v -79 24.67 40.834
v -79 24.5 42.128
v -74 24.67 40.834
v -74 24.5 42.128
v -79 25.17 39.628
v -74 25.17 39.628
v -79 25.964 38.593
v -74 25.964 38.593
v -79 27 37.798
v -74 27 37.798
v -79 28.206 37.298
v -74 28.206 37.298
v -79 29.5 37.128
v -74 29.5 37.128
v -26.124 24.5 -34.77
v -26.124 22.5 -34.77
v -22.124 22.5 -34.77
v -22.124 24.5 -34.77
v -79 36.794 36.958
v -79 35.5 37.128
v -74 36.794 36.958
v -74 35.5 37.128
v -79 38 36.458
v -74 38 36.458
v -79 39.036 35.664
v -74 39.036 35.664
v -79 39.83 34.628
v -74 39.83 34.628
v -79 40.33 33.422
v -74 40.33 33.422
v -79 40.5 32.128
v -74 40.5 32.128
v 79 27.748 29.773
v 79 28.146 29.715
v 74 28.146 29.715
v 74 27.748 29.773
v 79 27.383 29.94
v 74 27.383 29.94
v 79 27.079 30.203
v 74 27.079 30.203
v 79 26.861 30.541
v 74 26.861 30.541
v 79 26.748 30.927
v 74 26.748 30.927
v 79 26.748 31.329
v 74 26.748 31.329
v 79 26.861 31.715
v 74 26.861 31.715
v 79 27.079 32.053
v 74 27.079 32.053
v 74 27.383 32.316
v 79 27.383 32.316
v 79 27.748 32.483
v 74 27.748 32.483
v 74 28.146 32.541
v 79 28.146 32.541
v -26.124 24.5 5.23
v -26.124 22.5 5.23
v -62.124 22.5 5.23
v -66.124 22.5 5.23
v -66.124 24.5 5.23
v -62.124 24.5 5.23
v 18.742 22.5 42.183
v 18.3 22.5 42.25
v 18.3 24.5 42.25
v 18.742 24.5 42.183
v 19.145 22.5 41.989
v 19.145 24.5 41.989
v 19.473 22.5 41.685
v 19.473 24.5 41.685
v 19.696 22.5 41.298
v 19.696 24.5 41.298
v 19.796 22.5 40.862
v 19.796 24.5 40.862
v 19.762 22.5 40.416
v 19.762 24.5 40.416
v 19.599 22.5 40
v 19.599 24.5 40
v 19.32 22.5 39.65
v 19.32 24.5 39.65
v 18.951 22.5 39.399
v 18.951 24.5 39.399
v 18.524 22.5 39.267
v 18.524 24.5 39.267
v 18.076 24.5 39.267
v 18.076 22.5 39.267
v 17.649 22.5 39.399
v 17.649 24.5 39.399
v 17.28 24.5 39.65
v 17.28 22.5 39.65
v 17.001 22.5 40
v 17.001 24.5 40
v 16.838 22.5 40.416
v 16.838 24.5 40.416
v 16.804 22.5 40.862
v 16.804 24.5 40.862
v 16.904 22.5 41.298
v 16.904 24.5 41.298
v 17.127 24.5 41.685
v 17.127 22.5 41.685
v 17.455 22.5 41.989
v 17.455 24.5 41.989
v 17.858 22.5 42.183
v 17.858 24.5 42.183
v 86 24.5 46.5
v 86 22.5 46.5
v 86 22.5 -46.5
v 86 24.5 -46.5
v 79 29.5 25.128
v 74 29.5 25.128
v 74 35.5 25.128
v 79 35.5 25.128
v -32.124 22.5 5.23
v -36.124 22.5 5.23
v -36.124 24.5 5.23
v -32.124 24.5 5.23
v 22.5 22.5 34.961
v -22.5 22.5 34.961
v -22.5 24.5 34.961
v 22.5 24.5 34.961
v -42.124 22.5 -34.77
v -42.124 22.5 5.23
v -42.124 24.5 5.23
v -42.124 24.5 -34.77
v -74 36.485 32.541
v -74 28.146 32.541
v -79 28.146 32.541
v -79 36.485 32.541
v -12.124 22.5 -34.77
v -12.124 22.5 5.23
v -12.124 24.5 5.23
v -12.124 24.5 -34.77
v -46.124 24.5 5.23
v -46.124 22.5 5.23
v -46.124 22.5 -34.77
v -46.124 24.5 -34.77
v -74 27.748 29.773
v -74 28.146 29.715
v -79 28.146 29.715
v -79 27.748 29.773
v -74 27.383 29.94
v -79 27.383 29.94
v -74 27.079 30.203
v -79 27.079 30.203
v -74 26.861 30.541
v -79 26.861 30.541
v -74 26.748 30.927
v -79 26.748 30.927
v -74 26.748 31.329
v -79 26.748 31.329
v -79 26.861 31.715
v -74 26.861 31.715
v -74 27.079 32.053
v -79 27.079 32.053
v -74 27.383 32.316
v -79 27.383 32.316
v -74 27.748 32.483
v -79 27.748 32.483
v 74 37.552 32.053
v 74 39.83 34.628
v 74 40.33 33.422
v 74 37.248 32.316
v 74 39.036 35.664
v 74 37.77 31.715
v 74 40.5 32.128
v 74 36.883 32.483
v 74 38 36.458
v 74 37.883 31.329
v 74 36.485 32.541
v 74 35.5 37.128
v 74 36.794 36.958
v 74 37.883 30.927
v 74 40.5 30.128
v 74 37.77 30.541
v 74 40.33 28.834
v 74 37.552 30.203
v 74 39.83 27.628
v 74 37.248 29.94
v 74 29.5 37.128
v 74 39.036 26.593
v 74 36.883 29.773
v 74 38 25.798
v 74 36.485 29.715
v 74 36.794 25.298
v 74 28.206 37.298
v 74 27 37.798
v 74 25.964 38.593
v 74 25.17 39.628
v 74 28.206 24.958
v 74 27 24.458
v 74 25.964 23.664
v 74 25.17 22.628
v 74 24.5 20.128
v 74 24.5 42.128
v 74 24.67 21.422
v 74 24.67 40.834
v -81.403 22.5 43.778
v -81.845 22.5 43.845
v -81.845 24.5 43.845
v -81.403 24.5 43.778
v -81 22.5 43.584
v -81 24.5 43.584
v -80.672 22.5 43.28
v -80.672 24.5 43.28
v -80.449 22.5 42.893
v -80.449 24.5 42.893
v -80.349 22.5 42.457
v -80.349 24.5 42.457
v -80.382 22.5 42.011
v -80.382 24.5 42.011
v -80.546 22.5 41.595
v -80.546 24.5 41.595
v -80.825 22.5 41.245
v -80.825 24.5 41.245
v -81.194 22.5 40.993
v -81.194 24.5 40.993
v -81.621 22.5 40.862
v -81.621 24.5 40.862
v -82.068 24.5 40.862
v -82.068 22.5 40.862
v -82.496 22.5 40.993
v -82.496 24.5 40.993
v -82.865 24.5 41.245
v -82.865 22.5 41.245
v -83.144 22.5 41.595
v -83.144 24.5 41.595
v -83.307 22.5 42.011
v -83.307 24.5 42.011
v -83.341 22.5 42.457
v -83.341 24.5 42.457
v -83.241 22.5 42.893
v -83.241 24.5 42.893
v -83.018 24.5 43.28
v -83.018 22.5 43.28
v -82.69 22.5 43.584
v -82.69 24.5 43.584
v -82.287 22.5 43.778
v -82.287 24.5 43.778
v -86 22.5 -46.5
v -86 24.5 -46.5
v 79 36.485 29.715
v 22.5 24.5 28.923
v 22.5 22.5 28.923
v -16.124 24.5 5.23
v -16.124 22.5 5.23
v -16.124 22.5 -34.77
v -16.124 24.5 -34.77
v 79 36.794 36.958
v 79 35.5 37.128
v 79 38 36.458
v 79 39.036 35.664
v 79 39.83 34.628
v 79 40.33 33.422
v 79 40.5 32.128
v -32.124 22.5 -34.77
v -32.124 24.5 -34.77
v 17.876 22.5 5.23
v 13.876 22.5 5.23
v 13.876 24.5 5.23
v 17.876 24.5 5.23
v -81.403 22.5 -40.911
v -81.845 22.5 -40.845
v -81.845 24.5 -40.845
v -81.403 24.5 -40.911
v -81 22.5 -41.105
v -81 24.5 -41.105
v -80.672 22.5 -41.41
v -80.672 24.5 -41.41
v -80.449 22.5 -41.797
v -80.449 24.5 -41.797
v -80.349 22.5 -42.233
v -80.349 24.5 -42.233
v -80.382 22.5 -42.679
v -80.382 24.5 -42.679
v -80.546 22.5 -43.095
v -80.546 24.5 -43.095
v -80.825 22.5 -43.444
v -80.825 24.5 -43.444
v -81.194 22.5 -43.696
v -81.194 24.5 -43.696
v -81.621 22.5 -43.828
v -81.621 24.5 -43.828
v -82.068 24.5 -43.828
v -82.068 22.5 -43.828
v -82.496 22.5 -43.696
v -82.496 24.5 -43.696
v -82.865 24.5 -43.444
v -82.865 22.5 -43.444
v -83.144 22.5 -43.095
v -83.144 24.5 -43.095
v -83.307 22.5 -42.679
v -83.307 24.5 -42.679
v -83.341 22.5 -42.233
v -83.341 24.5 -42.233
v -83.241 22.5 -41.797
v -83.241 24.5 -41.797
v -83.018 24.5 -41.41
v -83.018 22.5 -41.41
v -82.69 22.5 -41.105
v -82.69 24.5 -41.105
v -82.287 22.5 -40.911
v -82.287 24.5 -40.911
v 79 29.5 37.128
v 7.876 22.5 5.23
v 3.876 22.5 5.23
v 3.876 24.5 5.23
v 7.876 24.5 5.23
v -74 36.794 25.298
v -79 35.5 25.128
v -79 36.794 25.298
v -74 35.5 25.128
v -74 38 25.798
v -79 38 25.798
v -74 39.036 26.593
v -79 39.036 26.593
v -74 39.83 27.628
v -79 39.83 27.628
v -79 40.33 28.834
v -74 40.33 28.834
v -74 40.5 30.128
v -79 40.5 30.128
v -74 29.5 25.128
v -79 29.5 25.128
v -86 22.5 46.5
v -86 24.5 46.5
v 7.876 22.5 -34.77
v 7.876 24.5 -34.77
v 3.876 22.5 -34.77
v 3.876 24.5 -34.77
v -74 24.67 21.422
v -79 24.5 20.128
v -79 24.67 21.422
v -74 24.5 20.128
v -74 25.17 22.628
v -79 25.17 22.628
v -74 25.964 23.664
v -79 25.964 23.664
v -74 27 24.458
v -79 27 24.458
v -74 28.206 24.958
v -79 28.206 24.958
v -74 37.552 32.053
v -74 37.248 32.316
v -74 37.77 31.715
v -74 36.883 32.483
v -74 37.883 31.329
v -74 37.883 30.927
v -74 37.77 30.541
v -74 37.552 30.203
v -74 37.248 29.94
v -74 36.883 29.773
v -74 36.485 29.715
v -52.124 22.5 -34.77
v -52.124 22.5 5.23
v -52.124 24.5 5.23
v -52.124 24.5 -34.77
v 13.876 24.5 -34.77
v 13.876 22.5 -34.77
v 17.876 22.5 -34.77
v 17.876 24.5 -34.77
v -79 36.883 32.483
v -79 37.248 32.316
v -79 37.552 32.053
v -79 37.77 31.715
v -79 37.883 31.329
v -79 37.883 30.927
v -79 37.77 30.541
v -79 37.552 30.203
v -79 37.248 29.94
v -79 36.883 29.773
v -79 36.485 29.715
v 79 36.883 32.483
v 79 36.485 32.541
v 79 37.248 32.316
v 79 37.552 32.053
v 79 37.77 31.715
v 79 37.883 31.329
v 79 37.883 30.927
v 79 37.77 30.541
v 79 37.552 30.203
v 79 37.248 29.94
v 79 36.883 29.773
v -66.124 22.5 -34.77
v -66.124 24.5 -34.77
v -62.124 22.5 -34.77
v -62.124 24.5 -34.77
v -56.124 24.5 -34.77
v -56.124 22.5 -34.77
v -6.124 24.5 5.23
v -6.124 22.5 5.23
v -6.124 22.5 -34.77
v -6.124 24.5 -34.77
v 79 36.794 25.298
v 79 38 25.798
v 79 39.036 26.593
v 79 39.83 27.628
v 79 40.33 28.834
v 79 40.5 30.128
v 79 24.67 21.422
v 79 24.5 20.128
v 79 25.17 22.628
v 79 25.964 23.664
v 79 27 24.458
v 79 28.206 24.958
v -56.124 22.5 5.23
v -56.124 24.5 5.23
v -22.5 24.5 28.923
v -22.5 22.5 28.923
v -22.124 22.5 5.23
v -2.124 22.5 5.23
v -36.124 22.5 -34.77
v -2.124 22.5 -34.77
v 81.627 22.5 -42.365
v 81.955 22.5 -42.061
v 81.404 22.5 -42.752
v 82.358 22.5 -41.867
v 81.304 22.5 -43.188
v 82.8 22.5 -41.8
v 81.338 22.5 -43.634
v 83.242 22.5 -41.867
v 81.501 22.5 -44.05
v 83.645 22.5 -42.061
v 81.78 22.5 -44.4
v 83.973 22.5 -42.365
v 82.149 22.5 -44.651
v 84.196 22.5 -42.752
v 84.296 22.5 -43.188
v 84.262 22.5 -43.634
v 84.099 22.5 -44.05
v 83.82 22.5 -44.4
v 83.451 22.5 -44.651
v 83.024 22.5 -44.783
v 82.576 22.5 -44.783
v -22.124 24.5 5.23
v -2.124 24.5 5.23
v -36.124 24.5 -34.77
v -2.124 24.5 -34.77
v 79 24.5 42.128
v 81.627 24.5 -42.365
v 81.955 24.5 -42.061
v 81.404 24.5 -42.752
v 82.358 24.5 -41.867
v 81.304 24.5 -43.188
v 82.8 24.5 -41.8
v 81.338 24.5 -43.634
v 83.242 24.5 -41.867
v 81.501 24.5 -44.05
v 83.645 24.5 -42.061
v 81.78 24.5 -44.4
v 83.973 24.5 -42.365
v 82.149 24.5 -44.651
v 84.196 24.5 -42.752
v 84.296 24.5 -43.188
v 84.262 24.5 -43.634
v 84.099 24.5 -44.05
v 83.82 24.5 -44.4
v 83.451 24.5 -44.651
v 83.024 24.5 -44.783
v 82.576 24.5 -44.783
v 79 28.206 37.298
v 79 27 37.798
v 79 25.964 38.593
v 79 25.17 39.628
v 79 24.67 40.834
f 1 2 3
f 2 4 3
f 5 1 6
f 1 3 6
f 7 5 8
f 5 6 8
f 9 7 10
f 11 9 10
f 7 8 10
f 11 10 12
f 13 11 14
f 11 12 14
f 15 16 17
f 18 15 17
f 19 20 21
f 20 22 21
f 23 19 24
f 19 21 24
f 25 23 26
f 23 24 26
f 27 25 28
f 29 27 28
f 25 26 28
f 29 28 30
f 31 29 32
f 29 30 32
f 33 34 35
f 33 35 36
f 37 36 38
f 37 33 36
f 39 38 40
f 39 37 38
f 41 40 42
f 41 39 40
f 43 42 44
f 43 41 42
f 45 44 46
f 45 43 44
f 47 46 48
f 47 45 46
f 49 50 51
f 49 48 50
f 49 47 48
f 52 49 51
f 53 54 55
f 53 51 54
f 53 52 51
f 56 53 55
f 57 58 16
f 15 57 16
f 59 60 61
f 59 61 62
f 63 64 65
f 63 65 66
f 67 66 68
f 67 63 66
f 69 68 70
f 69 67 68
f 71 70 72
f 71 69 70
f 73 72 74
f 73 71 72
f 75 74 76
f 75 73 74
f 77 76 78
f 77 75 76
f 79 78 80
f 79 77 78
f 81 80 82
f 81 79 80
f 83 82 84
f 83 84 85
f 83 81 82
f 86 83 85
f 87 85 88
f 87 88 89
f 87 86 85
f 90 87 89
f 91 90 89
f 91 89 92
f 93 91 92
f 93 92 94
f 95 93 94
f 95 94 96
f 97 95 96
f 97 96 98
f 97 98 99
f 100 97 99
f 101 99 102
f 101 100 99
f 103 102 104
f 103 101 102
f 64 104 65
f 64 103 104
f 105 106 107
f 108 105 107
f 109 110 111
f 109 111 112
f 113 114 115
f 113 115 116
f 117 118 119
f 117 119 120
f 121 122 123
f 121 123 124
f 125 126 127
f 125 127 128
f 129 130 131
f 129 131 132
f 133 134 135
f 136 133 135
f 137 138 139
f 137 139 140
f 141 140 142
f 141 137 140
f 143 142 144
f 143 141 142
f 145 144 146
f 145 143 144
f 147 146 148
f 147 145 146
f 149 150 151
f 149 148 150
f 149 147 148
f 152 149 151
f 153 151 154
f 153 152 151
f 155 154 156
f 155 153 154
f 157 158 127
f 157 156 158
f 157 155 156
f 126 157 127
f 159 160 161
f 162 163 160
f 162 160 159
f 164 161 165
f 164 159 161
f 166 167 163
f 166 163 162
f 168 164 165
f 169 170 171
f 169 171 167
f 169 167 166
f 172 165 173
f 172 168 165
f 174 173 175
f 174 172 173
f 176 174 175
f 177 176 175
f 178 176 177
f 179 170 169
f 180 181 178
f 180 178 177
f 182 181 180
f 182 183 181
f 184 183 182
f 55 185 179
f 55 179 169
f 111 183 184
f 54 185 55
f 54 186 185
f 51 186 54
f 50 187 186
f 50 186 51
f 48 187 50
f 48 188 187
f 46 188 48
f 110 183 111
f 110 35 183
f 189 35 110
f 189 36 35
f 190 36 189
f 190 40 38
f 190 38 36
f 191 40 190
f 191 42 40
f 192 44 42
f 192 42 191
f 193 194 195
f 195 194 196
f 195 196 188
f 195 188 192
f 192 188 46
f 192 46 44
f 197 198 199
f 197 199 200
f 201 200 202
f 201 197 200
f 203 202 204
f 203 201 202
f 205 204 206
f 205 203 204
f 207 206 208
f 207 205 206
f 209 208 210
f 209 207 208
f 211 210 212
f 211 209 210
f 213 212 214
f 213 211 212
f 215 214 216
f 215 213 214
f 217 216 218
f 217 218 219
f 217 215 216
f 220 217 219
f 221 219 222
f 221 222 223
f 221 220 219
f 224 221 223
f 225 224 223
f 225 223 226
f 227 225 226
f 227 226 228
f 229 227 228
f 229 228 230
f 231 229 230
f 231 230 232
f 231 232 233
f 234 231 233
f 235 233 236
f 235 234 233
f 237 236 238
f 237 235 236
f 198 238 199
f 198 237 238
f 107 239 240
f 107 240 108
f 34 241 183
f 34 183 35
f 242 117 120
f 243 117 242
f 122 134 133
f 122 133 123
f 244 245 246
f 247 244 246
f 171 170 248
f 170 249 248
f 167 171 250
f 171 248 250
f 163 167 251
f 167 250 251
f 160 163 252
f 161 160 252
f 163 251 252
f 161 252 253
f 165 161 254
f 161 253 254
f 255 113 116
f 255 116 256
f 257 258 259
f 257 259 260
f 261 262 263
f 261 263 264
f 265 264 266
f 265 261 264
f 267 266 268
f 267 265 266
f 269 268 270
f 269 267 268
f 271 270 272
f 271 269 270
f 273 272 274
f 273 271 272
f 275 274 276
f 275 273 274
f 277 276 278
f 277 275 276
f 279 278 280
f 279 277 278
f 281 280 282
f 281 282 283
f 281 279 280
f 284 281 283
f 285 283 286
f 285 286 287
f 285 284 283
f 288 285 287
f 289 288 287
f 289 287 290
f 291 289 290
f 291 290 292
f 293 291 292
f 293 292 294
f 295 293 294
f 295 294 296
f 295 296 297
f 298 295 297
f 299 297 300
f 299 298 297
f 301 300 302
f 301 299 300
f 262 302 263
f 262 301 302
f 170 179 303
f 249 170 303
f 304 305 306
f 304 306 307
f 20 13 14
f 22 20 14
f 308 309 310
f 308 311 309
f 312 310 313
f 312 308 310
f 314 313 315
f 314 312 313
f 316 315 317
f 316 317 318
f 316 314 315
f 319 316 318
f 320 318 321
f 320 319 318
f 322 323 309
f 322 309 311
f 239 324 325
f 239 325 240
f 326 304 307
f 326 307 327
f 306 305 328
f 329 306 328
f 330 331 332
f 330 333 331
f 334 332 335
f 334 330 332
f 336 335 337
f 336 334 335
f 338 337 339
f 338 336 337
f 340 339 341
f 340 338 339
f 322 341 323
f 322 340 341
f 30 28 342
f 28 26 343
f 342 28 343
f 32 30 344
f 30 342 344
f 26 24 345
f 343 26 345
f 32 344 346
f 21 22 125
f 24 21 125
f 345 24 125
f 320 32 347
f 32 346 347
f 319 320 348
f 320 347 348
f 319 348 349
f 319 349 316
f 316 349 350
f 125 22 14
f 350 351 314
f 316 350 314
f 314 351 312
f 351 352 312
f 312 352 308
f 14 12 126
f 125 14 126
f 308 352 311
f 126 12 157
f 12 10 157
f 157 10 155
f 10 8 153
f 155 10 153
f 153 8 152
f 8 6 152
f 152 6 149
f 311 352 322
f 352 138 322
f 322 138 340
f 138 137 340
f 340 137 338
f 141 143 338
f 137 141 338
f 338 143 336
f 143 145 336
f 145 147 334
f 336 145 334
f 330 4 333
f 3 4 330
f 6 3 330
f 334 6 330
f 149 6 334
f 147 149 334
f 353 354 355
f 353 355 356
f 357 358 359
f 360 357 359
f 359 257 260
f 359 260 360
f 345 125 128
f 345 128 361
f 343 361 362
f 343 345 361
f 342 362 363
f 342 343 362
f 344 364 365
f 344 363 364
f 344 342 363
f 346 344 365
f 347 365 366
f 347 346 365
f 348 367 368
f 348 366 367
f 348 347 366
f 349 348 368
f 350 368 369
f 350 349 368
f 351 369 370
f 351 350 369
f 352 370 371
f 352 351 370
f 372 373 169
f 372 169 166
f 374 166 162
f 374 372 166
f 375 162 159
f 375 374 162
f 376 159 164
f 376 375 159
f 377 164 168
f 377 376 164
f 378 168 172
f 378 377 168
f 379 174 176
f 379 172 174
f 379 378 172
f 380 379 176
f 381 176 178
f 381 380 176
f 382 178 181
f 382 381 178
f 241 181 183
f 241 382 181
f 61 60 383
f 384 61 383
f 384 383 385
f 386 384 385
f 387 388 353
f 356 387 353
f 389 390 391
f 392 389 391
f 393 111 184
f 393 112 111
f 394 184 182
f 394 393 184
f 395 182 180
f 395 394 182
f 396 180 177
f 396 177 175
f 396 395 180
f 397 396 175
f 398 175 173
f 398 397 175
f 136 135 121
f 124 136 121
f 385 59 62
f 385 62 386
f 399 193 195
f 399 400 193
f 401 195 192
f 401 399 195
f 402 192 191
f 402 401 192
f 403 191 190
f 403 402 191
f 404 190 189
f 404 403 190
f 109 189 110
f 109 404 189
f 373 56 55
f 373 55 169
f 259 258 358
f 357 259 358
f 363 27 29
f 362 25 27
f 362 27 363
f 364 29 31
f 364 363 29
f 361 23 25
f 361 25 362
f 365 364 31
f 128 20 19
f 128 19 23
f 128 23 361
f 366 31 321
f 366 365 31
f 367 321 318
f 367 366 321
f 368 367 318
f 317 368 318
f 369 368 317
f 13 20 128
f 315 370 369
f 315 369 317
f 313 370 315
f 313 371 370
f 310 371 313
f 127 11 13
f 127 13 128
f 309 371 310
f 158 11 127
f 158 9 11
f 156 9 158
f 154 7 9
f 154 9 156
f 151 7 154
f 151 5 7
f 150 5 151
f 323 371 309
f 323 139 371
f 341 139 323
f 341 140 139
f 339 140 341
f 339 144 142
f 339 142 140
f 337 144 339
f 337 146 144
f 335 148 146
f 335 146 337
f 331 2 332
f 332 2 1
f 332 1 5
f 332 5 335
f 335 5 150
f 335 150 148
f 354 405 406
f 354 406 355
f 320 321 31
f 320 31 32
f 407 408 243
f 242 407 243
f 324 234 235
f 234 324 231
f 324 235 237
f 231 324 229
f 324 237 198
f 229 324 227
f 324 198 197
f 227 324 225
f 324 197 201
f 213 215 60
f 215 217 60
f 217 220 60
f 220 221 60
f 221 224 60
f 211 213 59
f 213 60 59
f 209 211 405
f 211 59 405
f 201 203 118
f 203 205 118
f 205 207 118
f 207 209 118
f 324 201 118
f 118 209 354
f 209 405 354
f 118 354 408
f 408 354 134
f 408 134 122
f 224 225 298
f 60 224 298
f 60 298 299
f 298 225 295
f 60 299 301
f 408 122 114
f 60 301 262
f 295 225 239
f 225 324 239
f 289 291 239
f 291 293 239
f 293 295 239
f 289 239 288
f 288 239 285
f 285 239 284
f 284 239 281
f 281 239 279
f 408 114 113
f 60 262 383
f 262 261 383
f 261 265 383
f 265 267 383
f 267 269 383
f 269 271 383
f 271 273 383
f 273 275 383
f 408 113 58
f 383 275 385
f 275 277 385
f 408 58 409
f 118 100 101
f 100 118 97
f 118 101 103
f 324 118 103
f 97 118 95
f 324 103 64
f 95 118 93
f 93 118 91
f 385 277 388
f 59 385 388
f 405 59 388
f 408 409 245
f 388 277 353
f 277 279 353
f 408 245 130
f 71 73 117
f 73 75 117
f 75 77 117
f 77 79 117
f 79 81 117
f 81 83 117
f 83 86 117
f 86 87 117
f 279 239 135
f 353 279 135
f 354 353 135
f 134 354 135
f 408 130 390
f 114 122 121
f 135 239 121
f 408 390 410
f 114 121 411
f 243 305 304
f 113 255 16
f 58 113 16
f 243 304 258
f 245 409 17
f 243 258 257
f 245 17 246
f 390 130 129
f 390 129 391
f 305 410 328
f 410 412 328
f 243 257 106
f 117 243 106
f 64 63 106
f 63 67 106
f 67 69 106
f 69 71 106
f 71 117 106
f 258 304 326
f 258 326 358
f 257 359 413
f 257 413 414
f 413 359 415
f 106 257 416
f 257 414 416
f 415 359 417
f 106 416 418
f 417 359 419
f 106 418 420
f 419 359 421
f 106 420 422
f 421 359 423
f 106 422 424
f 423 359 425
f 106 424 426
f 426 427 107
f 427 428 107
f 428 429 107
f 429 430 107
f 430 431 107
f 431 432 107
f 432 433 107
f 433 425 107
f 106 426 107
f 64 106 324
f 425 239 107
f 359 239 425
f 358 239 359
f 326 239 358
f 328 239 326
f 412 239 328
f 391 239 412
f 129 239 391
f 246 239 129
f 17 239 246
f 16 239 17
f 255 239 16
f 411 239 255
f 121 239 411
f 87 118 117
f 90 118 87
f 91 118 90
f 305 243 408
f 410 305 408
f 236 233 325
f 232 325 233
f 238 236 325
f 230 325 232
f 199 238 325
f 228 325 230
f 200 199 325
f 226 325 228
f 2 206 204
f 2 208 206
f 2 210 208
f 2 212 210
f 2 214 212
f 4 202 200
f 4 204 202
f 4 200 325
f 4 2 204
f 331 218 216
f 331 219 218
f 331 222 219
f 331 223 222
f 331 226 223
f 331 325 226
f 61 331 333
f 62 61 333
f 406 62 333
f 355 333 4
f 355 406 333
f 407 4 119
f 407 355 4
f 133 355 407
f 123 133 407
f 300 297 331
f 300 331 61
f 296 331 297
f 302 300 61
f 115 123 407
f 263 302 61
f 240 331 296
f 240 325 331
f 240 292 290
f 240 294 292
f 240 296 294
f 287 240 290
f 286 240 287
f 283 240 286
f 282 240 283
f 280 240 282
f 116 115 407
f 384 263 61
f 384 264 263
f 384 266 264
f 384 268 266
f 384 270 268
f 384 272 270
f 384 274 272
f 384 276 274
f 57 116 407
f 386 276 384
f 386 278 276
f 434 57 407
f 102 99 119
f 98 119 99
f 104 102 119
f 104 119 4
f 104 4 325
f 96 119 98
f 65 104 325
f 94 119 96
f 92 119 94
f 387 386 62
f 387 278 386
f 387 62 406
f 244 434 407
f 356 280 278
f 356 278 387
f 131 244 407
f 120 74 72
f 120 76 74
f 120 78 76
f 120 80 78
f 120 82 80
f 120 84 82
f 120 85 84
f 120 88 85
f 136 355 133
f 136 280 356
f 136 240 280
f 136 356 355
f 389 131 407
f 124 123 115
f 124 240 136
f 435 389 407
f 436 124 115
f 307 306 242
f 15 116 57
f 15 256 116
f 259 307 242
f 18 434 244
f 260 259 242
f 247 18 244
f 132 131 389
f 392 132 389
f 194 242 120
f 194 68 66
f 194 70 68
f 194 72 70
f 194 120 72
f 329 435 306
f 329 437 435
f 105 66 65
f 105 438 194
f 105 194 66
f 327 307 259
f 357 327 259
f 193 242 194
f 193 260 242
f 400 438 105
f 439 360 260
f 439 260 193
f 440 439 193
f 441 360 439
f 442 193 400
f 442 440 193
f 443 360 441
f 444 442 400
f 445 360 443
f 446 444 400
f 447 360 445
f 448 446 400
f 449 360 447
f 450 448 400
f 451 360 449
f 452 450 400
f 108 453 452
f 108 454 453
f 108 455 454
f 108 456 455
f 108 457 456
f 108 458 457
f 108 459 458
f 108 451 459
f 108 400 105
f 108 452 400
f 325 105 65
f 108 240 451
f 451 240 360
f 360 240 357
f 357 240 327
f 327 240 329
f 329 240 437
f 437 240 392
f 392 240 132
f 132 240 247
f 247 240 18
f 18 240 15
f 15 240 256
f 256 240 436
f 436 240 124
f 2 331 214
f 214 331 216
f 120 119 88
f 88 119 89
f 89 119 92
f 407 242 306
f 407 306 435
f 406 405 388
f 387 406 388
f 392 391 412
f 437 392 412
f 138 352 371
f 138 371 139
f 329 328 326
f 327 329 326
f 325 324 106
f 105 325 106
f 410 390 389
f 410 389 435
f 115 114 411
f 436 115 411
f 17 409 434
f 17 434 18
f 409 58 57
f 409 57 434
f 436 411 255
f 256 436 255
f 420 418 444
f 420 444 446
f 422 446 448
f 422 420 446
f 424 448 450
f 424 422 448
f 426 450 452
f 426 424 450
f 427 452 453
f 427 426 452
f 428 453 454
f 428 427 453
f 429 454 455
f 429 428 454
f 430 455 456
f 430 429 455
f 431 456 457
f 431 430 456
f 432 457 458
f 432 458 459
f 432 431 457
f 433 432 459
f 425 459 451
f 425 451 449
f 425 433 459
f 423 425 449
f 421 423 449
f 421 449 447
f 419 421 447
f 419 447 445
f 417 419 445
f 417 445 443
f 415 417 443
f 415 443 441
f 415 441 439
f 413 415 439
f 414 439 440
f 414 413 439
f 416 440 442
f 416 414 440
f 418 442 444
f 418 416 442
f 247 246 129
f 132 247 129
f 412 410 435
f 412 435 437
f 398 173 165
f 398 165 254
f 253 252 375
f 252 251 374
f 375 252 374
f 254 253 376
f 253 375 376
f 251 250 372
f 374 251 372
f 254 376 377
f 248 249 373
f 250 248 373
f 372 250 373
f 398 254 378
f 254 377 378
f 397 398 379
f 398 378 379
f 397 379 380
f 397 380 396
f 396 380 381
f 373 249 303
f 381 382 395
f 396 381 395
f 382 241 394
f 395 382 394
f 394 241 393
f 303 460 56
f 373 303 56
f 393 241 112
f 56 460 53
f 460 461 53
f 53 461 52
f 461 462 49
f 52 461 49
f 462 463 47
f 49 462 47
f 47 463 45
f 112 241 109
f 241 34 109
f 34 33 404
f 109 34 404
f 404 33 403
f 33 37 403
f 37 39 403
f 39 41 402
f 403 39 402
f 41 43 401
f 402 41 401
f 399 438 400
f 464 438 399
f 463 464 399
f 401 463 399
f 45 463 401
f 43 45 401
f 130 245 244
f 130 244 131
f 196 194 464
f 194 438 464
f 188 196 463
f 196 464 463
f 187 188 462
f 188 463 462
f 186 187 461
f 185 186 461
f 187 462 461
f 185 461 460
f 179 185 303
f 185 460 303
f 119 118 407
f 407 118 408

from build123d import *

# Parameters (mm, degrees)
SKETCH1_W            = 172
SKETCH1_H            = 93
BOSS_EXTRUDE1_DEPTH  = 1
SKETCH2_W            = 172
SKETCH2_H            = 93
SKETCH2_W_2          = 169
SKETCH2_H_2          = 90
BOSS_EXTRUDE2_DEPTH  = 21.5
SKETCH3_W            = 14.5
SKETCH3_H            = 20
SKETCH3_W_2          = 16.2
SKETCH3_W_3          = 76
SKETCH3_H_2          = 7
CUT_EXTRUDE1_DEPTH   = 21.5
BOSS_EXTRUDE3_DEPTH  = 10
FILLET1_R            = 4
SKETCH5_R            = 1.5
BOSS_EXTRUDE4_DEPTH  = 2.5
BOSS_EXTRUDE5_DEPTH  = 10
SKETCH7_W            = 1.5
SKETCH7_H            = 3.5
BOSS_EXTRUDE6_DEPTH  = 10
FILLET2_R            = 4
SKETCH8_R            = 4
SKETCH8_R_2          = 1.5
BOSS_EXTRUDE7_DEPTH  = 14
SKETCH10_W           = 16
SKETCH10_H           = 4
CUT_EXTRUDE2_DEPTH   = 14
CUT_EXTRUDE3_DEPTH   = 1.6
FILLET3_R            = 4
SKETCH12_W           = 10
SKETCH12_H           = 6
SKETCH12_W_2         = 8
SKETCH12_H_2         = 8
CUT_EXTRUDE4_DEPTH   = 25.1
SKETCH13_W           = 6.4
SKETCH13_H           = 6.4
SKETCH13_W_2         = 6
SKETCH13_H_2         = 6
BOSS_EXTRUDE8_DEPTH  = 21.5
FILLET4_R            = 3
SKETCH14_R           = 1.5
CUT_EXTRUDE5_DEPTH   = 20
SKETCH15_W           = 172
SKETCH15_H           = 93
SKETCH15_R           = 1.5
SKETCH15_W_2         = 4
SKETCH15_H_2         = 40
SKETCH15_W_3         = 45
SKETCH15_H_3         = 6.0381788
BOSS_EXTRUDE9_DEPTH  = 2
SKETCH16_W           = 56
SKETCH16_H           = 7.274551358
CUT_EXTRUDE6_DEPTH   = 2
SKETCH17_W           = 5
SKETCH17_H           = 12
BOSS_EXTRUDE10_DEPTH = 16
FILLET6_R            = 5
CUT_EXTRUDE7_DEPTH   = 166


# Read off the part's stored shape, not the designer's step: Intersect2
# Some blends are built 0.0001 mm under size
with BuildPart() as part:
    # Sketch1 → Boss-Extrude1 (new body)
    with BuildSketch(Plane(origin=(0, 0, 0), x_dir=(1, 0, 0), z_dir=(0, 1, 0))):
        Rectangle(SKETCH1_W, SKETCH1_H)
    extrude(amount=BOSS_EXTRUDE1_DEPTH)

    # Sketch2 → Boss-Extrude2 (add)
    with BuildSketch(Plane(origin=(0, 1, 0), x_dir=(1, 0, 0), z_dir=(0, 1, 0))):
        Rectangle(SKETCH2_W, SKETCH2_H)
        Rectangle(SKETCH2_W_2, SKETCH2_H_2, mode=Mode.SUBTRACT)
    extrude(amount=BOSS_EXTRUDE2_DEPTH)

    # Sketch3 → Cut-Extrude1 (cut)
    with BuildSketch(Plane.XY.offset(46.5)):
        with Locations((74.75, 11)):
            Rectangle(SKETCH3_W, SKETCH3_H)
        with Locations((57.75, 11)):
            Rectangle(SKETCH3_W, SKETCH3_H)
        with Locations((39, 11)):
            Rectangle(SKETCH3_W_2, SKETCH3_H)
        with Locations((-30.2, 6.2)):
            Rectangle(SKETCH3_W_3, SKETCH3_H_2)
    extrude(amount=-CUT_EXTRUDE1_DEPTH, mode=Mode.SUBTRACT)

    # Sketch4 → Boss-Extrude3 (add)
    with BuildSketch(Plane(origin=(0, 1, 0), x_dir=(1, 0, 0), z_dir=(0, 1, 0))):
        Polygon((26.9, -45), (28.4, -45), (28.4, 40.1), (84.5, 40.1), (84.5, 41.6), (26.9, 41.6), align=None)
    extrude(amount=BOSS_EXTRUDE3_DEPTH)

    # Fillet1
    fillet1_edges = [part.edges().sort_by_distance(p)[0] for p in [
        (26.9, 6, 45),
    ]]
    fillet(fillet1_edges, radius=FILLET1_R)

    # Sketch5 → Boss-Extrude4 (add)
    # profile 1 of 4: a face of its own
    with BuildSketch(Plane(origin=(0, 1, 0), x_dir=(1, 0, 0), z_dir=(0, 1, 0))):
        with BuildLine():
            Line((28.4, 40.1), (35.4, 40.1))
            Line((35.4, 40.1), (35.4, 35.1))
            ThreePointArc((35.4, 35.1), (34.814213562, 33.685786438), (33.4, 33.1))
            Line((33.4, 33.1), (28.4, 33.1))
            Line((28.4, 33.1), (28.4, 40.1))
        make_face()
        with Locations(Location((32.6, 36.1, 0), (0, 0, 270))):
            Circle(SKETCH5_R, mode=Mode.SUBTRACT)
    # profile 2 of 4: a face of its own
    with BuildSketch(Plane(origin=(0, 1, 0), x_dir=(1, 0, 0), z_dir=(0, 1, 0))):
        with BuildLine():
            Line((84.5, 40.1), (77.5, 40.1))
            Line((77.5, 40.1), (77.5, 35.1))
            ThreePointArc((77.5, 35.1), (78.085786438, 33.685786438), (79.5, 33.1))
            Line((79.5, 33.1), (84.5, 33.1))
            Line((84.5, 33.1), (84.5, 40.1))
        make_face()
        with Locations(Location((80.3, 36.1, 0), (0, 0, 270))):
            Circle(SKETCH5_R, mode=Mode.SUBTRACT)
    # profile 3 of 4: a face of its own
    with BuildSketch(Plane(origin=(0, 1, 0), x_dir=(1, 0, 0), z_dir=(0, 1, 0))):
        with BuildLine():
            Line((28.4, -18.4), (33.533804299, -18.4))
            ThreePointArc((33.533804299, -18.4), (34.948017861, -18.985786438), (35.533804299, -20.4))
            Line((35.533804299, -20.4), (35.533804299, -23.4))
            ThreePointArc((35.533804299, -23.4), (34.948017861, -24.814213562), (33.533804299, -25.4))
            Line((33.533804299, -25.4), (28.4, -25.4))
            Line((28.4, -25.4), (28.4, -18.4))
        make_face()
        with Locations(Location((32.6, -21.9, 0), (0, 0, 270))):
            Circle(SKETCH5_R, mode=Mode.SUBTRACT)
    # profile 4 of 4: a face of its own
    with BuildSketch(Plane(origin=(0, 1, 0), x_dir=(1, 0, 0), z_dir=(0, 1, 0))):
        with BuildLine():
            Line((84.5, -18.4), (79.00543069, -18.4))
            ThreePointArc((79.00543069, -18.4), (77.591217128, -18.985786438), (77.00543069, -20.4))
            Line((77.00543069, -20.4), (77.00543069, -23.4))
            ThreePointArc((77.00543069, -23.4), (77.591217128, -24.814213562), (79.00543069, -25.4))
            Line((79.00543069, -25.4), (84.5, -25.4))
            Line((84.5, -25.4), (84.5, -18.4))
        make_face()
        with Locations(Location((80.3, -21.9, 0), (0, 0, 270))):
            Circle(SKETCH5_R, mode=Mode.SUBTRACT)
    extrude(amount=BOSS_EXTRUDE4_DEPTH)

    # Sketch6 → Boss-Extrude5 (add)
    with BuildSketch(Plane(origin=(0, 1, 0), x_dir=(1, 0, 0), z_dir=(0, 1, 0))):
        Polygon((-65.7, -40), (-68.2, -40), (-68.2, -37.9), (-65.7, -37.9), (-65.7, -36.402716815), (-69.7, -36.402716815), (-69.7, -41.5), (-65.7, -41.5), align=None)
        Polygon((5.3, -36.402716815), (5.3, -37.9), (7.8, -37.9), (7.8, -40), (5.3, -40), (5.3, -41.5), (9.3, -41.5), (9.3, -36.402716815), align=None)
    extrude(amount=BOSS_EXTRUDE5_DEPTH)

    # Sketch7 → Boss-Extrude6 (add)
    with BuildSketch(Plane(origin=(0, 1, 0), x_dir=(1, 0, 0), z_dir=(0, 1, 0))):
        with Locations((-68.95, -43.25)):
            Rectangle(SKETCH7_W, SKETCH7_H)
        with Locations((8.55, -43.25)):
            Rectangle(SKETCH7_W, SKETCH7_H)
    extrude(amount=BOSS_EXTRUDE6_DEPTH)

    # Fillet2
    fillet2_edges = [part.edges().sort_by_distance(p)[0] for p in [
        (-69.7, 6, 45),
        (9.3, 6, 45),
    ]]
    fillet(fillet2_edges, radius=FILLET2_R)

    # Sketch8 → Boss-Extrude7 (add)
    # profile 1 of 3: a face of its own
    with BuildSketch(Plane(origin=(0, 1, 0), x_dir=(1, 0, 0), z_dir=(0, 1, 0))):
        with Locations(Location((-38.2, -6, 0), (0, 0, 90))):
            Circle(SKETCH8_R)
        with Locations(Location((-38.2, -6, 0), (0, 0, 270))):
            Circle(SKETCH8_R_2, mode=Mode.SUBTRACT)
    # profile 2 of 3: a face of its own
    with BuildSketch(Plane(origin=(0, 1, 0), x_dir=(1, 0, 0), z_dir=(0, 1, 0))):
        with Locations(Location((-36.5, 40, 0), (0, 0, 90))):
            Circle(SKETCH8_R)
        with Locations(Location((-36.5, 40, 0), (0, 0, 270))):
            Circle(SKETCH8_R_2, mode=Mode.SUBTRACT)
    # profile 3 of 3: a face of its own
    with BuildSketch(Plane(origin=(0, 1, 0), x_dir=(1, 0, 0), z_dir=(0, 1, 0))):
        with Locations(Location((13.5, 17, 0), (0, 0, 90))):
            Circle(SKETCH8_R)
    extrude(amount=BOSS_EXTRUDE7_DEPTH)

    # Sketch10 → Cut-Extrude2 (cut)
    with BuildSketch(Plane(origin=(0, 0, -46.5), x_dir=(-1, 0, 0), z_dir=(0, 0, -1))):
        with Locations((-55.7, 3)):
            Rectangle(SKETCH10_W, SKETCH10_H)
    extrude(amount=-CUT_EXTRUDE2_DEPTH, mode=Mode.SUBTRACT)

    # Sketch11 → Cut-Extrude3 (cut)
    with BuildSketch(Plane(origin=(0, 0, -46.5), x_dir=(-1, 0, 0), z_dir=(0, 0, -1))):
        with BuildLine():
            Line((-65.7, 12), (-45.7, 12))
            ThreePointArc((-45.7, 12), (-44.285786438, 11.414213562), (-43.7, 10))
            Line((-43.7, 10), (-43.7, 3))
            ThreePointArc((-43.7, 3), (-44.285786438, 1.585786438), (-45.7, 1))
            Line((-45.7, 1), (-65.7, 1))
            ThreePointArc((-65.7, 1), (-67.114213562, 1.585786438), (-67.7, 3))
            Line((-67.7, 3), (-67.7, 10))
            ThreePointArc((-67.7, 10), (-67.114213562, 11.414213562), (-65.7, 12))
        make_face()
    extrude(amount=-CUT_EXTRUDE3_DEPTH, mode=Mode.SUBTRACT)

    # Fillet3
    # the kernel refuses this fillet: 4 mm, written as the material it adds along each edge
    with BuildSketch(Plane(origin=(-36.5, 1, -40), x_dir=(0, 0, -1), z_dir=(1, 0, 0))) as fillet3_piece_1_section:
        with BuildLine():
            CenterArc((4 + FILLET3_R, FILLET3_R), FILLET3_R, 180, 90)
            Line((4, FILLET3_R), (4, 0))
            Line((4, 0), (4 + FILLET3_R, 0))
        make_face()
    fillet3_piece_1 = revolve(axis=Axis((-36.5, 1, -40), (0, 1, 0)), mode=Mode.PRIVATE)
    fillet3_piece_1 = split(fillet3_piece_1, bisect_by=Plane(origin=(-36.5, 1, -45), z_dir=(0, 0, 1)), keep=Keep.TOP, mode=Mode.PRIVATE)
    add(fillet3_piece_1)
    with BuildSketch(Plane(origin=(-38.2, 1, 6), x_dir=(0, 0, -1), z_dir=(1, 0, 0))) as fillet3_piece_2:
        with BuildLine():
            CenterArc((4 + FILLET3_R, FILLET3_R), FILLET3_R, 180, 90)
            Line((4, FILLET3_R), (4, 0))
            Line((4, 0), (4 + FILLET3_R, 0))
        make_face()
    revolve(axis=Axis((-38.2, 1, 6), (0, 1, 0)))
    with BuildSketch(Plane(origin=(13.5, 1, -17), x_dir=(0, 0, -1), z_dir=(1, 0, 0))) as fillet3_piece_3:
        with BuildLine():
            CenterArc((4 + FILLET3_R, FILLET3_R), FILLET3_R, 180, 90)
            Line((4, FILLET3_R), (4, 0))
            Line((4, 0), (4 + FILLET3_R, 0))
        make_face()
    revolve(axis=Axis((13.5, 1, -17), (0, 1, 0)))

    # Sketch12 → Cut-Extrude4 (cut)
    with BuildSketch(Plane(origin=(0, 0, -46.5), x_dir=(-1, 0, 0), z_dir=(0, 0, -1))):
        with Locations((27.5, 12)):
            Rectangle(SKETCH12_W, SKETCH12_H)
        Polygon((-13.5, 15), (-13.5, 16), (6.5, 16), (6.5, 15), (6.5, 6), (-13.5, 6), align=None)
        with Locations((-29, 11)):
            Rectangle(SKETCH12_W_2, SKETCH12_H_2)
    extrude(amount=-CUT_EXTRUDE4_DEPTH, mode=Mode.SUBTRACT)

    # Sketch13 → Boss-Extrude8 (add)
    with BuildSketch(Plane(origin=(0, 1, 0), x_dir=(1, 0, 0), z_dir=(0, 1, 0))):
        with Locations((82.8, 43.3)):
            Rectangle(SKETCH13_W, SKETCH13_H)
        with Locations((-81.5, 42)):
            Rectangle(SKETCH13_W_2, SKETCH13_H_2)
        with Locations((-81.5, -42)):
            Rectangle(SKETCH13_W_2, SKETCH13_H_2)
        with BuildLine():
            Line((13.3, -45), (23.3, -45))
            Line((23.3, -45), (23.3, -39))
            ThreePointArc((23.3, -39), (22.128427125, -36.171572875), (19.3, -35))
            Line((19.3, -35), (17.3, -35))
            ThreePointArc((17.3, -35), (14.471572875, -36.171572875), (13.3, -39))
            Line((13.3, -39), (13.3, -45))
        make_face()
    extrude(amount=BOSS_EXTRUDE8_DEPTH)

    # Fillet4
    fillet4_edges = [part.edges().sort_by_distance(p)[0] for p in [
        (-78.5, 11.75, 39),
        (-78.5, 11.75, 45),
        (-84.5, 11.75, 39),
        (-78.5, 11.75, -39),
        (-78.5, 11.75, -45),
        (-84.5, 11.75, -39),
    ]]
    fillet(fillet4_edges, radius=FILLET4_R - 0.0001)  # a hair under: the kernel refuses the full size

    # Sketch14 → Cut-Extrude5 (cut)
    with BuildSketch(Plane(origin=(0, 22.5, 0), x_dir=(1, 0, 0), z_dir=(0, 1, 0))):
        with Locations(Location((-81.844819979, 42.344819979, 0), (0, 0, 270))):
            Circle(SKETCH14_R)
        with Locations(Location((-81.844819979, -42.344819979, 0), (0, 0, 270))):
            Circle(SKETCH14_R)
        with Locations(Location((18.3, -40.75, 0), (0, 0, 270))):
            Circle(SKETCH14_R)
        with Locations(Location((82.8, 43.3, 0), (0, 0, 270))):
            Circle(SKETCH14_R)
    extrude(amount=-CUT_EXTRUDE5_DEPTH, mode=Mode.SUBTRACT)

    # Sketch16 → Cut-Extrude6 (cut)
    with BuildSketch(Plane(origin=(86, 0, 0), x_dir=(0, 0, -1), z_dir=(1, 0, 0))):
        with Locations((8, 18.862724321)):
            Rectangle(SKETCH16_W, SKETCH16_H)
    extrude(amount=-CUT_EXTRUDE6_DEPTH, mode=Mode.SUBTRACT)


with BuildPart() as body_2:
    # Sketch15 → Boss-Extrude9 (new body)
    with BuildSketch(Plane(origin=(0, 22.5, 0), x_dir=(1, 0, 0), z_dir=(0, 1, 0))):
        Rectangle(SKETCH15_W, SKETCH15_H)
        with Locations(Location((82.8, 43.3, 0), (0, 0, 270))):
            Circle(SKETCH15_R, mode=Mode.SUBTRACT)
        with Locations(Location((18.3, -40.75, 0), (0, 0, 270))):
            Circle(SKETCH15_R, mode=Mode.SUBTRACT)
        with Locations(Location((-81.844819979, -42.344819979, 0), (0, 0, 270))):
            Circle(SKETCH15_R, mode=Mode.SUBTRACT)
        with Locations(Location((-81.844819979, 42.344819979, 0), (0, 0, 270))):
            Circle(SKETCH15_R, mode=Mode.SUBTRACT)
        with Locations((-54.124331846, 14.769848195)):
            Rectangle(SKETCH15_W_2, SKETCH15_H_2, mode=Mode.SUBTRACT)
        with Locations((-64.124331846, 14.769848195)):
            Rectangle(SKETCH15_W_2, SKETCH15_H_2, mode=Mode.SUBTRACT)
        with Locations((-44.124331846, 14.769848195)):
            Rectangle(SKETCH15_W_2, SKETCH15_H_2, mode=Mode.SUBTRACT)
        with Locations((-34.124331846, 14.769848195)):
            Rectangle(SKETCH15_W_2, SKETCH15_H_2, mode=Mode.SUBTRACT)
        with Locations((-24.124331846, 14.769848195)):
            Rectangle(SKETCH15_W_2, SKETCH15_H_2, mode=Mode.SUBTRACT)
        with Locations((-14.124331846, 14.769848195)):
            Rectangle(SKETCH15_W_2, SKETCH15_H_2, mode=Mode.SUBTRACT)
        with Locations((-4.124331846, 14.769848195)):
            Rectangle(SKETCH15_W_2, SKETCH15_H_2, mode=Mode.SUBTRACT)
        with Locations((5.875668154, 14.769848195)):
            Rectangle(SKETCH15_W_2, SKETCH15_H_2, mode=Mode.SUBTRACT)
        with Locations((15.875668154, 14.769848195)):
            Rectangle(SKETCH15_W_2, SKETCH15_H_2, mode=Mode.SUBTRACT)
        with Locations((0, -31.942161626)):
            Rectangle(SKETCH15_W_3, SKETCH15_H_3, mode=Mode.SUBTRACT)
    extrude(amount=BOSS_EXTRUDE9_DEPTH)

    # Sketch17 → Boss-Extrude10 (add)
    with BuildSketch(Plane(origin=(0, 24.5, 0), x_dir=(1, 0, 0), z_dir=(0, 1, 0))):
        with Locations((-76.5, -31.128066602)):
            Rectangle(SKETCH17_W, SKETCH17_H)
        with Locations((76.5, -31.128066602)):
            Rectangle(SKETCH17_W, SKETCH17_H)
    extrude(amount=BOSS_EXTRUDE10_DEPTH)

    # Fillet6
    fillet6_edges = [body_2.edges().sort_by_distance(p)[0] for p in [
        (-76.5, 24.5, 37.128066602),
        (-76.5, 24.5, 25.128066602),
        (-76.5, 40.5, 37.128066602),
        (-76.5, 40.5, 25.128066602),
        (76.5, 24.5, 25.128066602),
        (76.5, 24.5, 37.128066602),
        (76.5, 40.5, 25.128066602),
        (76.5, 40.5, 37.128066602),
    ]]
    fillet(fillet6_edges, radius=FILLET6_R)

    # Sketch18 → Cut-Extrude7 (cut)
    with BuildSketch(Plane(origin=(79, 0, 0), x_dir=(0, 0, -1), z_dir=(1, 0, 0))):
        with BuildLine():
            Line((-32.54071408, 28.146472212), (-32.54071408, 36.484701473))
            ThreePointArc((-32.54071408, 36.484701473), (-31.128066602, 37.89734895), (-29.715419125, 36.484701473))
            Line((-29.715419125, 36.484701473), (-29.715419125, 28.146472212))
            ThreePointArc((-29.715419125, 28.146472212), (-31.128066602, 26.733824735), (-32.54071408, 28.146472212))
        make_face()
    extrude(amount=-CUT_EXTRUDE7_DEPTH, mode=Mode.SUBTRACT)


solid = body_2.part
